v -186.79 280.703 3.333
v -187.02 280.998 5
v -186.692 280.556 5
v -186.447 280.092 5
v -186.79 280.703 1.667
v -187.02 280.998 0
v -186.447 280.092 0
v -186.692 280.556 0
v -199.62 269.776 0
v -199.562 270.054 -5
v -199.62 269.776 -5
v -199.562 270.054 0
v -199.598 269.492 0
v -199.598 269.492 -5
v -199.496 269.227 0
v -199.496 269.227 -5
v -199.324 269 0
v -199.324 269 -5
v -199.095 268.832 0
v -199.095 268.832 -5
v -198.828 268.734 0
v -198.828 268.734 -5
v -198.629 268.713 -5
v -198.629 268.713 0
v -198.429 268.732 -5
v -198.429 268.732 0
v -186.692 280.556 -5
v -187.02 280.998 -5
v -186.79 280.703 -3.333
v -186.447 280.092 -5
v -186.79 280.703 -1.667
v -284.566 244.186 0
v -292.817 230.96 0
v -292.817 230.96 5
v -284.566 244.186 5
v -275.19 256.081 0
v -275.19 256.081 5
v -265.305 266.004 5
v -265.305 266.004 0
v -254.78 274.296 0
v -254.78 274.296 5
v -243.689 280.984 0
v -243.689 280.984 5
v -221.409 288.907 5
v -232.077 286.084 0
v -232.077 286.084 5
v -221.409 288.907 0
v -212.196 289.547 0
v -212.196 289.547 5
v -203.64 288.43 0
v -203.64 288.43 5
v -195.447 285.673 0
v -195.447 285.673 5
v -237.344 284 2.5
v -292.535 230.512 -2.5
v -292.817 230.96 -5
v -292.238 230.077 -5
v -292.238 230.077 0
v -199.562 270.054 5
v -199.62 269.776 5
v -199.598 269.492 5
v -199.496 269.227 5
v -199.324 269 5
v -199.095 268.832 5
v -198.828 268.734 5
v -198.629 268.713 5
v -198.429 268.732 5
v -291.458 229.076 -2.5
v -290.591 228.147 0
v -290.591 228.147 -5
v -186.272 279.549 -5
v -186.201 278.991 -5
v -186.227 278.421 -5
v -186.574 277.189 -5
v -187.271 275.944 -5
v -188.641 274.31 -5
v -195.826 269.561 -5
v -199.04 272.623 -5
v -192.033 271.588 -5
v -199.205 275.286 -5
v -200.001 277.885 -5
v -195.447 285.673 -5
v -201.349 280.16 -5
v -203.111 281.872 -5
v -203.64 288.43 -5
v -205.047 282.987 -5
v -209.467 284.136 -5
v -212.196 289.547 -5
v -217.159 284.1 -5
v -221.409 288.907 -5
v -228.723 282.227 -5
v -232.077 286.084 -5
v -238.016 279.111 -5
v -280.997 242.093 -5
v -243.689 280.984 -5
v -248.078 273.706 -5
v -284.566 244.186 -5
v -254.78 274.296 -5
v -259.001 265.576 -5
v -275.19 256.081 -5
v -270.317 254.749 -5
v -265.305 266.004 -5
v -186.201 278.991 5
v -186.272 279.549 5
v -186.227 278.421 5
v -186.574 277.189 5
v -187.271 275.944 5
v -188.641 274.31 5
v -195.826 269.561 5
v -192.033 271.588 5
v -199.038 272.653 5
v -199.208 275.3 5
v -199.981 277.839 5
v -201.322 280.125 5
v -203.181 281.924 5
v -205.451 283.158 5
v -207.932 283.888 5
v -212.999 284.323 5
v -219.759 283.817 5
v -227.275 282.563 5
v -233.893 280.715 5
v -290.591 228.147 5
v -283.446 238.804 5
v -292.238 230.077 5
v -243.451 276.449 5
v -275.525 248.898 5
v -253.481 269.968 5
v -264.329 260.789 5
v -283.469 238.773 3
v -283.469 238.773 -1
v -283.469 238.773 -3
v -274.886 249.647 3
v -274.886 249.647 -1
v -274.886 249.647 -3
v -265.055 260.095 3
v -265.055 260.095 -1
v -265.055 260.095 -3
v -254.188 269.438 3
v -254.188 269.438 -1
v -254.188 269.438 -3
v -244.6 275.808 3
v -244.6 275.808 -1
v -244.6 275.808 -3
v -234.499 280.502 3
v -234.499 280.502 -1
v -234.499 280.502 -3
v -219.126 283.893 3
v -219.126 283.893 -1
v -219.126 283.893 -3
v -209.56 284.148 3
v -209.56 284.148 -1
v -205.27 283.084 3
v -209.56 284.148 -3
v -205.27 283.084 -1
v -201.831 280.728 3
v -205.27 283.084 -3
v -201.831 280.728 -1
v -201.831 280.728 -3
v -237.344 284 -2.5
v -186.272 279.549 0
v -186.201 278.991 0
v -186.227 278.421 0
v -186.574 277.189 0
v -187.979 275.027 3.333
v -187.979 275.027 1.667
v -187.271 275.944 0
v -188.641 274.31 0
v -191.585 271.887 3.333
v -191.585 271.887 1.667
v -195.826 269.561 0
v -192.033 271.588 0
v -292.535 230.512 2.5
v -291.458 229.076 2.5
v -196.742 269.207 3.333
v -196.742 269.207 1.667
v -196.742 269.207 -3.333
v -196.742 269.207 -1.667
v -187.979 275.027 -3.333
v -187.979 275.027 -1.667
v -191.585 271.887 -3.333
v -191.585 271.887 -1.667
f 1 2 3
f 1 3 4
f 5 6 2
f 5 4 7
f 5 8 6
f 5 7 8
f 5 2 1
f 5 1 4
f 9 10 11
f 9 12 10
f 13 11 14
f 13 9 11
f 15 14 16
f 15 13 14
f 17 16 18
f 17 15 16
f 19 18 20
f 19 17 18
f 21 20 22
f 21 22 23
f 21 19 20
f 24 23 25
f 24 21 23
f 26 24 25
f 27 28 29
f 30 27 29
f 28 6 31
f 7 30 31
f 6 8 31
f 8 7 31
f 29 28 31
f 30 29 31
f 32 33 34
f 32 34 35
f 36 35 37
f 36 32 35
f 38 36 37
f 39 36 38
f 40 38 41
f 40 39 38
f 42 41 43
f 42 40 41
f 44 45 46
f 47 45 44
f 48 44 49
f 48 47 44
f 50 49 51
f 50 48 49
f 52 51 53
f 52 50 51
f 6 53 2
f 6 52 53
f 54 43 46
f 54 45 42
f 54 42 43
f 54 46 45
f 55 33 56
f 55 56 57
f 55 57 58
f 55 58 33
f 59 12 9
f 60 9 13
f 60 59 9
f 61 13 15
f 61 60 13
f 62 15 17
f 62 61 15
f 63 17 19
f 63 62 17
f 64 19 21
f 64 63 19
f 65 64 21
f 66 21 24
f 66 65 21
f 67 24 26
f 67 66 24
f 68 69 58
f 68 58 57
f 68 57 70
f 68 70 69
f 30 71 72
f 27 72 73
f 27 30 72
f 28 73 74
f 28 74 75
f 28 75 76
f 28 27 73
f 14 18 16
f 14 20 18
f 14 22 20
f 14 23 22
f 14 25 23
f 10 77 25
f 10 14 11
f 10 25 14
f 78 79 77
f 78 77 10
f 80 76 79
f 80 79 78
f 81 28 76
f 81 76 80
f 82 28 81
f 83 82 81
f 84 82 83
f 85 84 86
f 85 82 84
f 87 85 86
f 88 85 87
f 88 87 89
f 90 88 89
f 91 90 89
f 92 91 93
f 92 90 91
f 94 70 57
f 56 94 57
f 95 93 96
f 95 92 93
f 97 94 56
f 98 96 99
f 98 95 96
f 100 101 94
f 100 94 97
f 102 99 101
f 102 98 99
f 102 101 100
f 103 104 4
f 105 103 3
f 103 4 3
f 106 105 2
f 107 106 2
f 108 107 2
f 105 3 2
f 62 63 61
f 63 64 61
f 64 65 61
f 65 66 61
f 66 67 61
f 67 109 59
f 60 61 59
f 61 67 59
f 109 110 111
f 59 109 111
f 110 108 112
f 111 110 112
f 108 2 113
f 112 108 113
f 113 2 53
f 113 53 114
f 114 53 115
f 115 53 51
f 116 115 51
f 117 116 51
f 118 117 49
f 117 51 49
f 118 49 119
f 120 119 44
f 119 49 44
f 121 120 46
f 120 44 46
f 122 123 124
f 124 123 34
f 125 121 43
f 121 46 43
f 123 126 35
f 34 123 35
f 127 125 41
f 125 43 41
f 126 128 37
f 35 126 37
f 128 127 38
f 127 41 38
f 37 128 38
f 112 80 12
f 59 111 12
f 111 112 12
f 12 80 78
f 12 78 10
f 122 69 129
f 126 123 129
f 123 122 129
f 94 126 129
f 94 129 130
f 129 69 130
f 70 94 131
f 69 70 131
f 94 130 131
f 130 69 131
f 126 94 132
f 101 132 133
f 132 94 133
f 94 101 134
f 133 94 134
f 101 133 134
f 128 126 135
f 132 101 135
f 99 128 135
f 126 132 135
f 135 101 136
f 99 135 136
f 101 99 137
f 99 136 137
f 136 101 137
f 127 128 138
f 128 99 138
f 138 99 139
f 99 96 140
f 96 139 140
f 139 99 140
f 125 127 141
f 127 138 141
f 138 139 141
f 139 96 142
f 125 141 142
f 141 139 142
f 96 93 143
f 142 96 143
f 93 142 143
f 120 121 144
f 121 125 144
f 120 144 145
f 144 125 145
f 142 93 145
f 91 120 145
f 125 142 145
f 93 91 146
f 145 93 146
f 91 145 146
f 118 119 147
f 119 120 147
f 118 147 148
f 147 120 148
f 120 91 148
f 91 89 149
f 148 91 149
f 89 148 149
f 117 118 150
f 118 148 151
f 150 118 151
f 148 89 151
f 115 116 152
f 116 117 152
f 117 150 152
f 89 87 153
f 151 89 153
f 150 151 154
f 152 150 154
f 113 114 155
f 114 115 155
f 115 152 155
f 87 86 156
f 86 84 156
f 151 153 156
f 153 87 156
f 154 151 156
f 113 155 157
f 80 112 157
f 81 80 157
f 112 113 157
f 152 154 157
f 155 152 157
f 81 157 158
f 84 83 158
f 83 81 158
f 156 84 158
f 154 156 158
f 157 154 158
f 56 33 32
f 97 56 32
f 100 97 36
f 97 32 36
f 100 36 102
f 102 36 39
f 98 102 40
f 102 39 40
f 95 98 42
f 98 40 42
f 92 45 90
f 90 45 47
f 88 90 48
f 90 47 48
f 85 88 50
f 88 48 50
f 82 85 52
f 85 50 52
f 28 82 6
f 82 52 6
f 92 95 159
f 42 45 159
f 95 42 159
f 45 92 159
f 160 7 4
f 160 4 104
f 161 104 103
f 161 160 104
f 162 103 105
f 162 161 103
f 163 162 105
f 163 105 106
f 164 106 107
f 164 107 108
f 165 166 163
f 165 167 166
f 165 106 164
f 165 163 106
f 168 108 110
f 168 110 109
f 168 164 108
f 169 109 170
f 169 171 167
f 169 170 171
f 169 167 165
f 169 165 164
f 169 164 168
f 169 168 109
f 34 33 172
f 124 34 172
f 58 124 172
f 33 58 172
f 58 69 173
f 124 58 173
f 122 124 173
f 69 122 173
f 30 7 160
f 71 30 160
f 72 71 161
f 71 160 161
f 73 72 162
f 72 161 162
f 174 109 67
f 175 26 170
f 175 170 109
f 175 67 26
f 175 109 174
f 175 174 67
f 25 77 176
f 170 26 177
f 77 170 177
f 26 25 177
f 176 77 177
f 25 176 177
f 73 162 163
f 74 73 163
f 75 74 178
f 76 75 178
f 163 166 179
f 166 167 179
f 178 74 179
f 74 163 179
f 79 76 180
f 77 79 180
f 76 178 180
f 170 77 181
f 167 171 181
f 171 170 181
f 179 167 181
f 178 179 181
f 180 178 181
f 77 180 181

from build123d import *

# Parameters (mm, degrees)
BOSS_EXTRUDE2_DEPTH     = 5
CUT_EXTRUDE1_DEPTH      = 10
CUT_EXTRUDE1_DEPTH_BACK = 10
FILLET1_R               = 1


with BuildPart() as part:
    # Sketch1 → Boss-Extrude2 (new, symmetric)
    with BuildSketch(Plane.XY):
        with BuildLine():
            add(Edge.make_bspline(
                [(-287.625269042, 225.8864515), (-270.189162674, 244.30260865), (-250.405500955, 277.878469404), (-205.45891028, 282.750306441), (-200.229269232, 268.655423214)],
                knots=[0, 0, 0, 0, 0.680162275, 1, 1, 1, 1], degree=3))
            add(Edge.make_bspline(
                [(-200.229269232, 268.655423214), (-196.567908783, 267.949644162), (-184.229279467, 275.176515906), (-186.559670758, 280.462502314), (-187.019986372, 280.997877447)],
                knots=[0.780421407, 0.780421407, 0.780421407, 0.780421407, 1.561841694, 1.657025081, 1.657025081, 1.657025081, 1.657025081], degree=3))
            add(Edge.make_bspline(
                [(-292.817022104, 230.95956863), (-279.371305125, 255.218678458), (-248.405916062, 286.070404634), (-205.470098812, 293.353762035), (-187.019986372, 280.997877447)],
                knots=[0, 0, 0, 0, 0.593504623, 0.97724346, 0.97724346, 0.97724346, 0.97724346], degree=3))
            add(Edge.make_bspline(
                [(-292.817022104, 230.95956863), (-290.926247708, 227.837866768), (-287.625269042, 225.8864515)],
                knots=[0.533622587, 0.533622587, 0.533622587, 1, 1, 1], degree=2))
        make_face()
    extrude(amount=BOSS_EXTRUDE2_DEPTH, both=True)

    # Sketch2 → Cut-Extrude1 (cut, two sides: drawn at the far end of the back side and taken through both)
    with BuildSketch(Plane.XY.offset(5).offset(-CUT_EXTRUDE1_DEPTH_BACK)):
        with BuildLine():
            add(Edge.make_bspline(
                [(-290.590953302, 228.147328954), (-282.162851045, 241.84756263), (-263.967238021, 264.674207252), (-236.817722683, 280.744930994), (-219.239801341, 284.380312268), (-200.481533448, 285.093301358), (-197.997136713, 272.340391732), (-200.229269232, 268.655423214)],
                knots=[0, 0, 0, 0, 0.44455468, 0.627570264, 0.754797123, 0.896888453, 1, 1, 1, 1], degree=3))
            add(Edge.make_bspline(
                [(-200.229269232, 268.655423214), (-170.510432211, 254.072904929), (-317.665595473, 183.556494313), (-290.590953302, 228.147328954)],
                knots=[0, 0, 0, 0, 1, 1, 1, 1], degree=3))
        make_face()
    extrude(amount=CUT_EXTRUDE1_DEPTH + CUT_EXTRUDE1_DEPTH_BACK, mode=Mode.SUBTRACT)

    # Fillet1
    fillet1_edges = [part.edges().sort_by_distance(p)[0] for p in [
        (-200.229269232, 268.655423214, 2.5),
    ]]
    fillet(fillet1_edges, radius=FILLET1_R)


solid = part.part
